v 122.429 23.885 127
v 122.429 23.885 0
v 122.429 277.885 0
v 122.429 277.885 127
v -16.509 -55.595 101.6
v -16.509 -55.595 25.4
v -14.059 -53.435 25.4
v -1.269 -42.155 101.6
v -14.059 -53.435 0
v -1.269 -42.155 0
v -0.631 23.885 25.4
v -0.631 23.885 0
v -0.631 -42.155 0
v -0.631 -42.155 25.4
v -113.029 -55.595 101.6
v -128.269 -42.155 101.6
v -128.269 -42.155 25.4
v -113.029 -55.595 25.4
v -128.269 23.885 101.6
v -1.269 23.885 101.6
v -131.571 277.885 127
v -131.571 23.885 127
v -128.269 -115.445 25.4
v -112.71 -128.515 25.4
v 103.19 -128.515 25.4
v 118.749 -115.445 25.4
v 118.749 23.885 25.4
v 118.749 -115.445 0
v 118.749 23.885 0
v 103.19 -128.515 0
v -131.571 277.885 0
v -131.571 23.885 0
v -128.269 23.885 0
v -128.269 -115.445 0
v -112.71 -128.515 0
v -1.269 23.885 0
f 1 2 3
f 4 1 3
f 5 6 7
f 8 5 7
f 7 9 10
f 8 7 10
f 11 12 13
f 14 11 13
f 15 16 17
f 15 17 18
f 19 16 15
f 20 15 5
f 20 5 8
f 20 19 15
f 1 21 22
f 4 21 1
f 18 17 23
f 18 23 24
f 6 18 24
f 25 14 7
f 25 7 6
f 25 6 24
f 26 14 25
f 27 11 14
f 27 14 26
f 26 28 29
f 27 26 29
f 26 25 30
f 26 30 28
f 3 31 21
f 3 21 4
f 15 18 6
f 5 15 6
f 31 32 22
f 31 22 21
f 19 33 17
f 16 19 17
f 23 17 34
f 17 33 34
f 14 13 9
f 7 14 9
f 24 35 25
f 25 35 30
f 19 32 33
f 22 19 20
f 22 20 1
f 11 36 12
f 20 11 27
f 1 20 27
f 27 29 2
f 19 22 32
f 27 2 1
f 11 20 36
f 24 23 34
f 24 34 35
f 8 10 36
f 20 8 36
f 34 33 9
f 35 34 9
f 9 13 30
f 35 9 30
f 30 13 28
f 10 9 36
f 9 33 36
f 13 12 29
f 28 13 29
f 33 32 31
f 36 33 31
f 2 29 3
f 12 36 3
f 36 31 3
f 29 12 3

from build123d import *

# Parameters (mm, degrees)
F0_W     = 254
F0_H     = 254
F2_DEPTH = 127
F3_DEPTH = 101.6
F5_DEPTH = 25.4


with BuildPart() as f2:
    # F0 (on Top) → F2 (new body)
    with BuildSketch(Plane.XY):
        with Locations((-4.570606, 150.885063)):
            Rectangle(F0_W, F0_H)
    extrude(amount=F2_DEPTH)

    # F1 (on face) → F3 (join)
    with BuildSketch(Plane.XY):
        Polygon((-1.268606, 23.885063), (-128.268606, 23.885063), (-128.268606, -42.154937), (-113.028606, -55.595354), (-16.508606, -55.595354), (-1.268606, -42.154937), align=None)
    extrude(amount=F3_DEPTH)

    # F4 (on Top) → F5 (join)
    with BuildSketch(Plane.XY):
        Polygon((103.190219, -128.514937), (118.749044, -115.44492), (118.749044, 23.885063), (-0.630956, 23.885063), (-0.630956, -42.154937), (-16.189781, -55.224955), (-112.709781, -55.224955), (-128.268606, -42.154937), (-128.268606, -115.44492), (-112.709781, -128.514937), align=None)
    extrude(amount=F5_DEPTH)


solid = f2.part
